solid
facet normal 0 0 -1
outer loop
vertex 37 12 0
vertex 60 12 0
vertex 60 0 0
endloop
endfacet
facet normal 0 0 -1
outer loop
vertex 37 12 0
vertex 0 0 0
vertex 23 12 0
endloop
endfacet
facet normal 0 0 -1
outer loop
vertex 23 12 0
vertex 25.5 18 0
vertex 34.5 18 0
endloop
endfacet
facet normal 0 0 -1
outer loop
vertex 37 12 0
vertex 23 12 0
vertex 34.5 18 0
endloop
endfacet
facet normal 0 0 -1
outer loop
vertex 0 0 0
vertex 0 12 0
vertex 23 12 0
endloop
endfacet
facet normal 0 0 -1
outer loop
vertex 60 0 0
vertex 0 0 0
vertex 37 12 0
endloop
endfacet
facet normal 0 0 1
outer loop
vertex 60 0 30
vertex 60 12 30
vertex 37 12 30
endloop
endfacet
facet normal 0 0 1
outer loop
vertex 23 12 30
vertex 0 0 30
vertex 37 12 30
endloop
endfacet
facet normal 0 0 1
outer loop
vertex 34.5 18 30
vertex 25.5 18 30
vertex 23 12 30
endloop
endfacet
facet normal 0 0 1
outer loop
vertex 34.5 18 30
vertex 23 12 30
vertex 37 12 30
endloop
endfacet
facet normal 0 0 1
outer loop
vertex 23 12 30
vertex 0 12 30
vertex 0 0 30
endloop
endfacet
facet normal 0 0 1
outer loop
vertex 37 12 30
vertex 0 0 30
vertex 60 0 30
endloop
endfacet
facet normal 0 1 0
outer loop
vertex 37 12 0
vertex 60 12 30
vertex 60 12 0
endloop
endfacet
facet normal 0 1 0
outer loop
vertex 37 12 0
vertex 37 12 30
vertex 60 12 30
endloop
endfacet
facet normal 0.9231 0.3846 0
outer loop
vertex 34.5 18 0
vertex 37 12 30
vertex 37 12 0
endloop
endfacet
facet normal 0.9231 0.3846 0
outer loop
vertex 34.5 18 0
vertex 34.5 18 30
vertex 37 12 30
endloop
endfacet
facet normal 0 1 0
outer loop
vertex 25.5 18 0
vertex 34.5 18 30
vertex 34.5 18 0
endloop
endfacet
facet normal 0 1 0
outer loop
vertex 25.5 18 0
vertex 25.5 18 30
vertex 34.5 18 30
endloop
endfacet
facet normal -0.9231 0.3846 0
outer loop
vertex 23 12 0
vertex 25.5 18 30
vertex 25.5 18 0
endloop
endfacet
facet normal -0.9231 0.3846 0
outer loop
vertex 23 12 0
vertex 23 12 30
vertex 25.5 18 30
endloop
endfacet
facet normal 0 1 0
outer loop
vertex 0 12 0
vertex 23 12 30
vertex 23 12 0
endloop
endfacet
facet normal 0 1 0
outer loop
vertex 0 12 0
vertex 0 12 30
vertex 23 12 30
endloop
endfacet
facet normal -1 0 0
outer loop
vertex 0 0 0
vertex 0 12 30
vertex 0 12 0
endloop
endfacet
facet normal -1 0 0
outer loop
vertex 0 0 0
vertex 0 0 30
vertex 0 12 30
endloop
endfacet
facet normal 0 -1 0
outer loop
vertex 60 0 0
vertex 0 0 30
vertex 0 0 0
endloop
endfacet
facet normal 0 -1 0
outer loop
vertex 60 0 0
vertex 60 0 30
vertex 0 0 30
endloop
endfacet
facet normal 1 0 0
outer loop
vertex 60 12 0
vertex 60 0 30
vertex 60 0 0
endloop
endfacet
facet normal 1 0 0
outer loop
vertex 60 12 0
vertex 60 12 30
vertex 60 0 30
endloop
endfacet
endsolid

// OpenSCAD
$fn = 32;

// ----------------------------------------------------------------------
// V guide rail: dovetail, 60 mm wide
// ----------------------------------------------------------------------

// --- parameters (mm) ---
rail_w = 60;              // rail width, X
base_t = 12;              // base plate thickness
v_depth = 6;              // V feature depth / height
v_half_w = 7;             // half width of the V at the base face
plate_t = 30;             // rail length, Z (the extrusion height)
top_half_w = 4.5;         // half width at the dovetail top
fit_tol = 0.05;           // declared fit tolerance (prompt contract)
free_tol = 0.2;           // declared free tolerance (prompt contract)

dovetail_base = 2 * v_half_w;  // dovetail width at the base
dovetail_top = 2 * top_half_w;  // dovetail width at the top

profile = [[0, 0], [60, 0], [60, 12], [37, 12], [34.5, 18], [25.5, 18], [23, 12], [0, 12]];  // primary outline, 8 points, counter clockwise

// --- the one profile operation ---
linear_extrude(height = plate_t) polygon(points = profile);
